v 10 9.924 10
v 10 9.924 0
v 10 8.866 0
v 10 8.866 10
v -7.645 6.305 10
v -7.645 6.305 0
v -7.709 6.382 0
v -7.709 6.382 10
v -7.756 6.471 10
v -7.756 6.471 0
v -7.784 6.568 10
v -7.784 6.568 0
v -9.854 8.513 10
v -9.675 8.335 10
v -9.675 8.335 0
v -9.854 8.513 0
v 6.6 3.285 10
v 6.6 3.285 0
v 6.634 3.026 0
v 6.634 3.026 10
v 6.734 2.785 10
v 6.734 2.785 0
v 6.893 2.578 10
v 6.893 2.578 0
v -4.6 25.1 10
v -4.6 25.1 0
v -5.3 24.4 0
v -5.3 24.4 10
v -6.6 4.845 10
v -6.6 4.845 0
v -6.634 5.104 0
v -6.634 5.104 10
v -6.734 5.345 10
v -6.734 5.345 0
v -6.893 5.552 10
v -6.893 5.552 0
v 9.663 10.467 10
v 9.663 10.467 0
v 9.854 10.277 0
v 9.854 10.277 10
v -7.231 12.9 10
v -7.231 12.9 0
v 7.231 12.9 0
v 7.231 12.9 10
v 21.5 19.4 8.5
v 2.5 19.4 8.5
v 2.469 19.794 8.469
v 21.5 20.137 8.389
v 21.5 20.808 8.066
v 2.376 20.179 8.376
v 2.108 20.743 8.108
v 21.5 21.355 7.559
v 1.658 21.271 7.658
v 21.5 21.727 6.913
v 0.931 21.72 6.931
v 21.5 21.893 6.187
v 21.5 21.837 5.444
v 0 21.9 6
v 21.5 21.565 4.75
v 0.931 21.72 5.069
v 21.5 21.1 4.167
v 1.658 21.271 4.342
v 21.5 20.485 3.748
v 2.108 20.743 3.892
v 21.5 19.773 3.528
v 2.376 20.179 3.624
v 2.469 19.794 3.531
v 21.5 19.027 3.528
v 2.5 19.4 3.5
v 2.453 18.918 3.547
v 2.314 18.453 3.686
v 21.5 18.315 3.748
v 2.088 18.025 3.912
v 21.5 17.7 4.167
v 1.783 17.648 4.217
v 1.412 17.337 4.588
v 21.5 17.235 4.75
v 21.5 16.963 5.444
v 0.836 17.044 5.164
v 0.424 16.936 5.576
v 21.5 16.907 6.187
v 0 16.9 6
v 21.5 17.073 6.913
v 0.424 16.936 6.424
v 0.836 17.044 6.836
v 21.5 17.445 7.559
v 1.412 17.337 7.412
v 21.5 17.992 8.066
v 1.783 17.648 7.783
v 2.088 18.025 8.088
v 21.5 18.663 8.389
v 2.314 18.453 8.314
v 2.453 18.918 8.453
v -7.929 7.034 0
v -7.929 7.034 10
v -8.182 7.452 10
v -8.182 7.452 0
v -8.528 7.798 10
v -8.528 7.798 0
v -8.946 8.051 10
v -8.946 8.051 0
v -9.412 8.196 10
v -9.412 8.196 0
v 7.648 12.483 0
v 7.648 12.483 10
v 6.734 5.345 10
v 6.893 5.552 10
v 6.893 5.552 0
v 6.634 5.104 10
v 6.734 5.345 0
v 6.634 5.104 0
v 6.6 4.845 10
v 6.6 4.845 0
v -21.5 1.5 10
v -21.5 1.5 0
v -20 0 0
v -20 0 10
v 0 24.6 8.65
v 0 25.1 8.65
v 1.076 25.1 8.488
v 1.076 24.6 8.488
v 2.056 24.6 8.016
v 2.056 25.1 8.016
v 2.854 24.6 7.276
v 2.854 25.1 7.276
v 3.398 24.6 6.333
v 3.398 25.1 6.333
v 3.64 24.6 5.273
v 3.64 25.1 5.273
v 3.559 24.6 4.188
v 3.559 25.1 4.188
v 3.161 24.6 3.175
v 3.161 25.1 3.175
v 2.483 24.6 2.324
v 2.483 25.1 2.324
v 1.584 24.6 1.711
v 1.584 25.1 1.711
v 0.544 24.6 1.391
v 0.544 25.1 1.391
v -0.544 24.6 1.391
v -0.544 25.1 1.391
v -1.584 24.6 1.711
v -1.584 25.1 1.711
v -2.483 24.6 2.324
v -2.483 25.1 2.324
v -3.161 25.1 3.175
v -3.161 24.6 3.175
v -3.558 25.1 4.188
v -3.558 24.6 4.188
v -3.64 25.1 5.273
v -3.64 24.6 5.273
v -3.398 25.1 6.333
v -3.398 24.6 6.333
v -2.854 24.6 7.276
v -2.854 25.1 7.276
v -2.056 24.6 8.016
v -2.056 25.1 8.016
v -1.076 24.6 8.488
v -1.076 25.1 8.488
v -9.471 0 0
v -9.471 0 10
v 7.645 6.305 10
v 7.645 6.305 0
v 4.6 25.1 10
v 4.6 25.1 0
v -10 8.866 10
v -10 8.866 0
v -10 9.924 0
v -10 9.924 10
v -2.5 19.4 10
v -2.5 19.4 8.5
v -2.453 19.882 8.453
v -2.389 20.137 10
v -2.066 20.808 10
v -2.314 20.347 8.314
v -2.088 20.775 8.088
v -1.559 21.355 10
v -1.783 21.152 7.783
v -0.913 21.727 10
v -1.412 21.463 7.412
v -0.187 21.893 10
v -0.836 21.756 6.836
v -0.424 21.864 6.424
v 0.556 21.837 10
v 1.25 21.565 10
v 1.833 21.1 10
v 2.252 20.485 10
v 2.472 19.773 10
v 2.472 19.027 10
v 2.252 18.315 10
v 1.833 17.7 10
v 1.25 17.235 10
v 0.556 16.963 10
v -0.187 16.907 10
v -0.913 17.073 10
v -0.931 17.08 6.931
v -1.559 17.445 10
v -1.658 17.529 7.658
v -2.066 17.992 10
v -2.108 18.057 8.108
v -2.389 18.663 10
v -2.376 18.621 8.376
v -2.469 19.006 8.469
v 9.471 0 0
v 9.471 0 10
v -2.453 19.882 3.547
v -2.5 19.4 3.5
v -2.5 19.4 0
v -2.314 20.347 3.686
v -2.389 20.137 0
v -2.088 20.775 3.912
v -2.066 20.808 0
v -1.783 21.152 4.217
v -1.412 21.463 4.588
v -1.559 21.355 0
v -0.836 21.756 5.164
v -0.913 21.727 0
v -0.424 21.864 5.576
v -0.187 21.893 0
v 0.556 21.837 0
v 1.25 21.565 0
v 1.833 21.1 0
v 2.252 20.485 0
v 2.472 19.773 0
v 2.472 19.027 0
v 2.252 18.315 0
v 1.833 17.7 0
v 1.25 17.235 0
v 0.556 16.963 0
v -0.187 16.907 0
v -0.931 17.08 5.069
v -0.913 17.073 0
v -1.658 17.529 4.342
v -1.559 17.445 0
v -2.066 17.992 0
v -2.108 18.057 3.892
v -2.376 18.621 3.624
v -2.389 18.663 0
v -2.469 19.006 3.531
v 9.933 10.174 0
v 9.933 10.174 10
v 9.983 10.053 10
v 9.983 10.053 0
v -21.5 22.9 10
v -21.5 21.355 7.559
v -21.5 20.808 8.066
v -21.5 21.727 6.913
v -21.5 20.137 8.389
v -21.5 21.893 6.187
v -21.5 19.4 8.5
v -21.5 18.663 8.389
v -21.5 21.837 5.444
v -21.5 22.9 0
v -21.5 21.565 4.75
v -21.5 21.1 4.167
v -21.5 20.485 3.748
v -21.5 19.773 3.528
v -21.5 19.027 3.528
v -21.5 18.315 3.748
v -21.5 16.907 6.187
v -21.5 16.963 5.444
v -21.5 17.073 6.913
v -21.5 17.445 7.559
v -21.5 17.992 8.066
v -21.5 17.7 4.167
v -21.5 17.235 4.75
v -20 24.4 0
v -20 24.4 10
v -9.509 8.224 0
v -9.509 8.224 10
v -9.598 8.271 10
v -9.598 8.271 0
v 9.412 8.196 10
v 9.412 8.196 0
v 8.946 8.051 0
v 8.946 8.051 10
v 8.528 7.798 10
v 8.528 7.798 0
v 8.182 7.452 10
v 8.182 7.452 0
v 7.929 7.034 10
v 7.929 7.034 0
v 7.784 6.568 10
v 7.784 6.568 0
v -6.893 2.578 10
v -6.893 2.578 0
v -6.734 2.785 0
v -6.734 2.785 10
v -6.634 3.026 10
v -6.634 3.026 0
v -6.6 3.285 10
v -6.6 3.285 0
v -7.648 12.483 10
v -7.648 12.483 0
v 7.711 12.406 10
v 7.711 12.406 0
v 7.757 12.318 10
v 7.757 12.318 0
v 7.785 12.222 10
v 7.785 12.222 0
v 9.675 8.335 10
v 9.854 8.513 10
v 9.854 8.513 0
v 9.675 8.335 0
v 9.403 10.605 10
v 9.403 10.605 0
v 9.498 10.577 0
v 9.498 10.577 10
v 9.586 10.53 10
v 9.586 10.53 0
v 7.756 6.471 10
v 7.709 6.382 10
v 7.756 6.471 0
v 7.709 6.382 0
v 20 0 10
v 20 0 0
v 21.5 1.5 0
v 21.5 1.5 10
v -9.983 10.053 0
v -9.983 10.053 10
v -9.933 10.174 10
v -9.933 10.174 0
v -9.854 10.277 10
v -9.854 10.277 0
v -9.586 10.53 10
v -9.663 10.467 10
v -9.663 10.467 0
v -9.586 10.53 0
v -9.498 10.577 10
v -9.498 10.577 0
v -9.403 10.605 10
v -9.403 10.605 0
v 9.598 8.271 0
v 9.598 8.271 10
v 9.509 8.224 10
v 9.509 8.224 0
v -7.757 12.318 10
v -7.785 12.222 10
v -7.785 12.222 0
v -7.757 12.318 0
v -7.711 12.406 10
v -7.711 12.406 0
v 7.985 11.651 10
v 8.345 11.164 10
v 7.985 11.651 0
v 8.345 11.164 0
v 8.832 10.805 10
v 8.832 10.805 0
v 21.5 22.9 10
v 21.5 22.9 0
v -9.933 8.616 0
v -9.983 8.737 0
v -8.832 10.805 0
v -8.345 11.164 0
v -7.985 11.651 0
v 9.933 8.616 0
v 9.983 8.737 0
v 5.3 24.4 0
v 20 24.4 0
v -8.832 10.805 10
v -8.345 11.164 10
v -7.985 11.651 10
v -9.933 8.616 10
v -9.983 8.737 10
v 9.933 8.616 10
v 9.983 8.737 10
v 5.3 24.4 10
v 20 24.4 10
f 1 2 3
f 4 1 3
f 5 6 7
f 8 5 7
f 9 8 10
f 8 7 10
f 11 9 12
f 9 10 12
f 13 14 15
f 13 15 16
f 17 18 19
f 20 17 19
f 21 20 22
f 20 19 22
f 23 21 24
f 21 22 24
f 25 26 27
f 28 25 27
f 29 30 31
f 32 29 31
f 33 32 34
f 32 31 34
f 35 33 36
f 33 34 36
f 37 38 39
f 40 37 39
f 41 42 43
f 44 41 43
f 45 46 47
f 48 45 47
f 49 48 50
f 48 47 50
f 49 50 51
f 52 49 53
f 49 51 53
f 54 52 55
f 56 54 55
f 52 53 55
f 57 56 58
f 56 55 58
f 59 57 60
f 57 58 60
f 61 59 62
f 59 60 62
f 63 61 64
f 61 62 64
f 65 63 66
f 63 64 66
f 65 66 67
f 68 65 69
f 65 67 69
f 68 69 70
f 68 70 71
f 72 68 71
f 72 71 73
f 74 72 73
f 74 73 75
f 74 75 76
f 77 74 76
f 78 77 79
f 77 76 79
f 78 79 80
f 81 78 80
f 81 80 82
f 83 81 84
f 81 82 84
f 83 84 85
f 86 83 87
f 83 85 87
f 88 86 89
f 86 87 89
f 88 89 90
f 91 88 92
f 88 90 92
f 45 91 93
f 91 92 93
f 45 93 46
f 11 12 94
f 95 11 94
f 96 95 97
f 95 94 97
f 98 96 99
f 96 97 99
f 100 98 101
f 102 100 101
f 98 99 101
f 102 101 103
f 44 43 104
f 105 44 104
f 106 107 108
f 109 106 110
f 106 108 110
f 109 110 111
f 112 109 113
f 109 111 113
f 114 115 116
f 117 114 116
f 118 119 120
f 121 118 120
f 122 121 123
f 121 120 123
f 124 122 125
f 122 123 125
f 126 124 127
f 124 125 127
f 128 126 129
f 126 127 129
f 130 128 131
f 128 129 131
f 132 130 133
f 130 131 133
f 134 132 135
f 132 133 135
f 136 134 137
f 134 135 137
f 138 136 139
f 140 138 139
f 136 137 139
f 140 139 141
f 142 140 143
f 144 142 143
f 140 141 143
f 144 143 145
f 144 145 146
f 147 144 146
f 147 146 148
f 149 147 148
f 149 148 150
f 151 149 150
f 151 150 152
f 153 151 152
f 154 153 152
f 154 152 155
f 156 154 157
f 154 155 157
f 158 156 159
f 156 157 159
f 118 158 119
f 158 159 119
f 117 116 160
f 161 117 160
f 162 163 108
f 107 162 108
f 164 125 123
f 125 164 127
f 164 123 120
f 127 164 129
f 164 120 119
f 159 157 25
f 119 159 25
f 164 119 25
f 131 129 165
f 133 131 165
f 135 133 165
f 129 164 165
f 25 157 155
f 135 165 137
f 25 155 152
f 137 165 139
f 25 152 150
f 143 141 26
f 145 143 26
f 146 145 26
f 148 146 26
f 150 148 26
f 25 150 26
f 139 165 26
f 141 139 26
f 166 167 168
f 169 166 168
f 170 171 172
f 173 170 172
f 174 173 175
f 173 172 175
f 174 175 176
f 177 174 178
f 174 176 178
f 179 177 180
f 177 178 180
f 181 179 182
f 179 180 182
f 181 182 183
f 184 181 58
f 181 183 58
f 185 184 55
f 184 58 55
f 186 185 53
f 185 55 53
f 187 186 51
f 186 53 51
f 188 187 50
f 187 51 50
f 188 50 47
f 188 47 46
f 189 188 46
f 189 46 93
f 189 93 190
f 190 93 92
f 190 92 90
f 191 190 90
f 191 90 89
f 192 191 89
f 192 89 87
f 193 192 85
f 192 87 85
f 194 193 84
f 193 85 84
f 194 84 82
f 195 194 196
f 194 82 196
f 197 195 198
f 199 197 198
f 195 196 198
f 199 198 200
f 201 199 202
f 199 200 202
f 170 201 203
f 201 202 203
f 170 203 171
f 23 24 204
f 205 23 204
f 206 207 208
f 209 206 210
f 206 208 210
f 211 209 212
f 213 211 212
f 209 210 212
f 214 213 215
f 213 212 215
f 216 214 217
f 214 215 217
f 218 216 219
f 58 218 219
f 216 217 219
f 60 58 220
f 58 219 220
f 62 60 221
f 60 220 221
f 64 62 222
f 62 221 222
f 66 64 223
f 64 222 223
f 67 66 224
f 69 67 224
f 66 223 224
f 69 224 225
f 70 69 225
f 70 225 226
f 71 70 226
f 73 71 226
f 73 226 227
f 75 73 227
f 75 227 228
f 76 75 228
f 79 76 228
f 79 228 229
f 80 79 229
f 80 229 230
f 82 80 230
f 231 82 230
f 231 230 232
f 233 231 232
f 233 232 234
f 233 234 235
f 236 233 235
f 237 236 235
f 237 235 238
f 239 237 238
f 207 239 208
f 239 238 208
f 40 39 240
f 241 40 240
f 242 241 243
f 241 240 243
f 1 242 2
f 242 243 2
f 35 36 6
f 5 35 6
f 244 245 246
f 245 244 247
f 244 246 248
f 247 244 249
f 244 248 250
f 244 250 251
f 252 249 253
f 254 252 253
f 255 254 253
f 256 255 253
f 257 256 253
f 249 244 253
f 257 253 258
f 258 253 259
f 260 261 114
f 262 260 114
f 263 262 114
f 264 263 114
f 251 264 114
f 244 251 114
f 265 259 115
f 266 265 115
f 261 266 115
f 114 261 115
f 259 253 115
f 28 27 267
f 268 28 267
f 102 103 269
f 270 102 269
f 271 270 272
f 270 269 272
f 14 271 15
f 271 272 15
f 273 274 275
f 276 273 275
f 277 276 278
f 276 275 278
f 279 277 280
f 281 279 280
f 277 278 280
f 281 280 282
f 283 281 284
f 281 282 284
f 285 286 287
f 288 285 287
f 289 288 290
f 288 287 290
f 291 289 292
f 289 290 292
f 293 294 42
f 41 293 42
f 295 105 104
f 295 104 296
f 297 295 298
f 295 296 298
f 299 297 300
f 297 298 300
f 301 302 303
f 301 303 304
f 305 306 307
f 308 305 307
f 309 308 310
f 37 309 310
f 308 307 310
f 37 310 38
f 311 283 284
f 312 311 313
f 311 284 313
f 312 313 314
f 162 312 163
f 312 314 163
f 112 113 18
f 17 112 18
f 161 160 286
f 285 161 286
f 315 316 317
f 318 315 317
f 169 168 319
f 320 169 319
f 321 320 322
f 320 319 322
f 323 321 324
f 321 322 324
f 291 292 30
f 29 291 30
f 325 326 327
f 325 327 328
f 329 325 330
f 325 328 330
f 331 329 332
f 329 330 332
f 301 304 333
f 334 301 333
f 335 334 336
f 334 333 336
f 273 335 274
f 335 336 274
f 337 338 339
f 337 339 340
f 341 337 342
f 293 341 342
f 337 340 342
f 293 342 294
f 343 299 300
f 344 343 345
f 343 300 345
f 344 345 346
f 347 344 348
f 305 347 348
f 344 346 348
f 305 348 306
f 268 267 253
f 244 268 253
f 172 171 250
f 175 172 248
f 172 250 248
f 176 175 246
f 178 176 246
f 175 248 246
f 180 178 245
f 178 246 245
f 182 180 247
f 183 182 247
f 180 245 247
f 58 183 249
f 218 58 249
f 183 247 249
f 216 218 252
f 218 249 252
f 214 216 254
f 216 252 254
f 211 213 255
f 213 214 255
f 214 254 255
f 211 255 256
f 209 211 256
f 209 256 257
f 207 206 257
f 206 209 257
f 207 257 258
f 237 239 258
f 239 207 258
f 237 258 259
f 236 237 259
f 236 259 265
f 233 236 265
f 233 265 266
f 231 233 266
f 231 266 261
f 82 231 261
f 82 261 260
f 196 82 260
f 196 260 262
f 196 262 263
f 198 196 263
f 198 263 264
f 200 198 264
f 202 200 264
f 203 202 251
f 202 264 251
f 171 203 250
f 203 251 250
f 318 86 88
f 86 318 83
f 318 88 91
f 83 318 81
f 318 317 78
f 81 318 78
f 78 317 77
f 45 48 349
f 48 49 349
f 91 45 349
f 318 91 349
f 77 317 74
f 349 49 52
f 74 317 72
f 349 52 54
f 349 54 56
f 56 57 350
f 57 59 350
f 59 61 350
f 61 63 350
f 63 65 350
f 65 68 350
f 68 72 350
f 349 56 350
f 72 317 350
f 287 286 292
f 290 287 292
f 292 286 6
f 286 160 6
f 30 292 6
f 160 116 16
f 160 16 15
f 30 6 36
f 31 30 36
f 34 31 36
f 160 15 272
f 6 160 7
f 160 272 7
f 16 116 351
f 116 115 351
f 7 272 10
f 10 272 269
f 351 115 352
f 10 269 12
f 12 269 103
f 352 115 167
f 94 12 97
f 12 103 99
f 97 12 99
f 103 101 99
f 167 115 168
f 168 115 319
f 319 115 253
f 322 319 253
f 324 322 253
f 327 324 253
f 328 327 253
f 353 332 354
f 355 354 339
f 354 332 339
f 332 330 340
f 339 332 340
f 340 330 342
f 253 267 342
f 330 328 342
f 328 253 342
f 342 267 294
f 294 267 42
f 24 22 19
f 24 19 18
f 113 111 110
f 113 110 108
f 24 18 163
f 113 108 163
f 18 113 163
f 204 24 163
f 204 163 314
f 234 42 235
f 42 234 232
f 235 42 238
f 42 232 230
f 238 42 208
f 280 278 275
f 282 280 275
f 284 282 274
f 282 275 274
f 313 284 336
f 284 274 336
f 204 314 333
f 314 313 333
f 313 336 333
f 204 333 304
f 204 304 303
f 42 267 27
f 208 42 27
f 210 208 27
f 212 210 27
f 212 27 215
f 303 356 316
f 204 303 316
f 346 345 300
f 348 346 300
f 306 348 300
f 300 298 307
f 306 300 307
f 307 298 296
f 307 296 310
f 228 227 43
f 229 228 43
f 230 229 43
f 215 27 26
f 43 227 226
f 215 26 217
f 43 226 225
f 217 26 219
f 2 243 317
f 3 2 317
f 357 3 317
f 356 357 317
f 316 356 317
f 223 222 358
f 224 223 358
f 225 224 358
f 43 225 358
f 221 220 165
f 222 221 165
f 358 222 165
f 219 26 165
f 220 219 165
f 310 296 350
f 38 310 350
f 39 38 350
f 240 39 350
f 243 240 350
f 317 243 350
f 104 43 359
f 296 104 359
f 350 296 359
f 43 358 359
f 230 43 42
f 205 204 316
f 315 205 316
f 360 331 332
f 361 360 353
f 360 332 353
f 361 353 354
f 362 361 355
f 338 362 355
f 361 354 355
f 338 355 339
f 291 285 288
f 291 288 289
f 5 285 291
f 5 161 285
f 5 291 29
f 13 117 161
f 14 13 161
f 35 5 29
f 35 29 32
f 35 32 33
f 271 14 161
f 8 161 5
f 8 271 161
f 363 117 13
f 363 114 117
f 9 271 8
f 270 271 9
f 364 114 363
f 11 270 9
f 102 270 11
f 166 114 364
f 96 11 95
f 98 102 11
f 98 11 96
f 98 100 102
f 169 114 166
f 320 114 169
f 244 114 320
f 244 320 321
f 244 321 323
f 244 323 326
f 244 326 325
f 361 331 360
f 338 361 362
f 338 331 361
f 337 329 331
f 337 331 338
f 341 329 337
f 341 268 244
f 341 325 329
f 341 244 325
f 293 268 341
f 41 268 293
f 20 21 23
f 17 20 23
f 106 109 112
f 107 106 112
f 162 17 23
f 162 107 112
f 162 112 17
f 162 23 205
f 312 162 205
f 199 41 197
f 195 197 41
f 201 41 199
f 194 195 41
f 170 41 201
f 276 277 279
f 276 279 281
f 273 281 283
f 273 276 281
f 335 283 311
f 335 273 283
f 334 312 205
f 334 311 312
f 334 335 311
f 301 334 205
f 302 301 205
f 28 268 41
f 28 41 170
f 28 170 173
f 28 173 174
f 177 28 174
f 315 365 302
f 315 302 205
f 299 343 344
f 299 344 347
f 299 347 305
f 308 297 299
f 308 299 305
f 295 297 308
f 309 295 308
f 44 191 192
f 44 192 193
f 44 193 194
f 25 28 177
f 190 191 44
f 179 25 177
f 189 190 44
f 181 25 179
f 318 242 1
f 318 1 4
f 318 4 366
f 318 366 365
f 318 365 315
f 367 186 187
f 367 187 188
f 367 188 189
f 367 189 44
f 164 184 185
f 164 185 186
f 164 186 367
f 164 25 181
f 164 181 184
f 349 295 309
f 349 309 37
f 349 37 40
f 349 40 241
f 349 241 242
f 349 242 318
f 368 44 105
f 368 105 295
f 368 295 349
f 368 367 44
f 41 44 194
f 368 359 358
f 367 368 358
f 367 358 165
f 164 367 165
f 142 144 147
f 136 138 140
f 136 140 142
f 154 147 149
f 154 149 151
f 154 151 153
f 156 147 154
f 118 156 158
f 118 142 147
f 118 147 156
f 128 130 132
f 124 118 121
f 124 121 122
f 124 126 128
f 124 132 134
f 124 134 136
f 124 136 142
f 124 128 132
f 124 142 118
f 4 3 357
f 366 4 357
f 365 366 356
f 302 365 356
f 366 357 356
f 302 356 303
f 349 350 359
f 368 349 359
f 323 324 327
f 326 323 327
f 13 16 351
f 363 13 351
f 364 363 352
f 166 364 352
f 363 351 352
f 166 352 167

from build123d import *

# Parameters (mm, degrees)
ENDCAP_1_DEPTH                  = 10
TAP_DRILL_FOR_M6X1_0_TAP1_D     = 5
TAP_DRILL_FOR_M6X1_0_TAP1_DEPTH = 12.5
TAP_DRILL_FOR_M6X1_0_TAP1_TIP   = 1.301417626
TAP_DRILL_FOR_M6X1_0_TAP2_D     = 5
SKETCH9_R                       = 3.65
CUT_EXTRUDE1_DEPTH              = 0.5


with BuildPart() as part:
    # Sketch3 → Endcap 1 (new body)
    with BuildSketch(Plane.XY):
        with BuildLine():
            Line((-7.230720611, 12.9), (7.230720611, 12.9))
            Line((7.230720611, 12.9), (7.647672674, 12.483047938))
            ThreePointArc((7.647672674, 12.483047938), (7.736182466, 12.363118479), (7.785406885, 12.222427275))
            ThreePointArc((7.785406885, 12.222427275), (8.344607784, 11.164307384), (9.402727675, 10.605106485))
            ThreePointArc((9.402727675, 10.605106485), (9.54341888, 10.555882066), (9.663348338, 10.467372274))
            Line((9.663348338, 10.467372274), (9.853553391, 10.277167221))
            ThreePointArc((9.853553391, 10.277167221), (9.961939766, 10.114955546), (10, 9.92361383))
            Line((10, 9.92361383), (10, 8.86638617))
            ThreePointArc((10, 8.86638617), (9.961939766, 8.675044454), (9.853553391, 8.512832779))
            Line((9.853553391, 8.512832779), (9.675343394, 8.334622782))
            ThreePointArc((9.675343394, 8.334622782), (9.554347216, 8.245550888), (9.412352167, 8.19644607))
            ThreePointArc((9.412352167, 8.19644607), (8.344607784, 7.635448616), (7.783610331, 6.567704234))
            ThreePointArc((7.783610331, 6.567704234), (7.734505512, 6.425709184), (7.645433618, 6.304713007))
            Line((7.645433618, 6.304713007), (6.892893219, 5.552172608))
            ThreePointArc((6.892893219, 5.552172608), (6.676120468, 5.227749259), (6.6, 4.845065826))
            Line((6.6, 4.845065826), (6.6, 3.284934173))
            ThreePointArc((6.6, 3.284934173), (6.676120468, 2.902250741), (6.892893219, 2.577827392))
            Line((6.892893219, 2.577827392), (9.470720611, 0))
            Line((9.470720611, 0), (19.9998779, 0))
            Line((19.9998779, 0), (21.5, 1.5))
            Line((21.5, 1.5), (21.5, 22.9))
            Line((21.5, 22.9), (20.0001221, 24.4))
            Line((20.0001221, 24.4), (5.3001221, 24.4))
            Line((5.3001221, 24.4), (4.6001221, 25.1))
            Line((4.6001221, 25.1), (-4.5998779, 25.1))
            Line((-4.5998779, 25.1), (-5.2998779, 24.4))
            Line((-5.2998779, 24.4), (-19.9998779, 24.4))
            Line((-19.9998779, 24.4), (-21.5, 22.8997558))
            Line((-21.5, 22.8997558), (-21.5, 1.5))
            Line((-21.5, 1.5), (-19.9998779, 0))
            Line((-19.9998779, 0), (-9.470720611, 0))
            Line((-9.470720611, 0), (-6.892893219, 2.577827392))
            ThreePointArc((-6.892893219, 2.577827392), (-6.676120468, 2.902250741), (-6.6, 3.284934173))
            Line((-6.6, 3.284934173), (-6.6, 4.845065826))
            ThreePointArc((-6.6, 4.845065826), (-6.676120468, 5.227749259), (-6.892893219, 5.552172608))
            Line((-6.892893219, 5.552172608), (-7.645433618, 6.304713006))
            ThreePointArc((-7.645433618, 6.304713006), (-7.734505512, 6.425709184), (-7.783610331, 6.567704233))
            ThreePointArc((-7.783610331, 6.567704233), (-8.344607784, 7.635448616), (-9.412352167, 8.19644607))
            ThreePointArc((-9.412352167, 8.19644607), (-9.554347216, 8.245550888), (-9.675343394, 8.334622782))
            Line((-9.675343394, 8.334622782), (-9.853553391, 8.512832779))
            ThreePointArc((-9.853553391, 8.512832779), (-9.961939766, 8.675044454), (-10, 8.86638617))
            Line((-10, 8.86638617), (-10, 9.92361383))
            ThreePointArc((-10, 9.92361383), (-9.961939766, 10.114955546), (-9.853553391, 10.277167221))
            Line((-9.853553391, 10.277167221), (-9.663348338, 10.467372274))
            ThreePointArc((-9.663348338, 10.467372274), (-9.543418879, 10.555882066), (-9.402727675, 10.605106485))
            ThreePointArc((-9.402727675, 10.605106485), (-8.344607784, 11.164307384), (-7.785406885, 12.222427275))
            ThreePointArc((-7.785406885, 12.222427275), (-7.736182466, 12.363118479), (-7.647672674, 12.483047938))
            Line((-7.647672674, 12.483047938), (-7.230720611, 12.9))
        make_face()
    extrude(amount=ENDCAP_1_DEPTH)

    # Tap Drill for M6x1.0 Tap1
    with Locations(Plane.XY.offset(10)):
        with Locations((0, 19.4)):
            Hole(TAP_DRILL_FOR_M6X1_0_TAP1_D / 2, depth=TAP_DRILL_FOR_M6X1_0_TAP1_DEPTH)
            with Locations((0, 0, -(TAP_DRILL_FOR_M6X1_0_TAP1_DEPTH + TAP_DRILL_FOR_M6X1_0_TAP1_TIP / 2))):  # 125° drill point
                Cone(0, TAP_DRILL_FOR_M6X1_0_TAP1_D / 2, TAP_DRILL_FOR_M6X1_0_TAP1_TIP, mode=Mode.SUBTRACT)

    # Tap Drill for M6x1.0 Tap2 (through all)
    with Locations(Plane(origin=(21.5, 0, 0), x_dir=(0, 0, -1), z_dir=(1, 0, 0))):
        with Locations((-6, 19.4)):
            Hole(TAP_DRILL_FOR_M6X1_0_TAP2_D / 2)

    # Sketch9 → Cut-Extrude1 (cut)
    with BuildSketch(Plane(origin=(0, 25.1, 0), x_dir=(1, 0, 0), z_dir=(0, 1, 0))):
        with Locations((0.0001221, -5)):
            Circle(SKETCH9_R)
    extrude(amount=-CUT_EXTRUDE1_DEPTH, mode=Mode.SUBTRACT)


solid = part.part
